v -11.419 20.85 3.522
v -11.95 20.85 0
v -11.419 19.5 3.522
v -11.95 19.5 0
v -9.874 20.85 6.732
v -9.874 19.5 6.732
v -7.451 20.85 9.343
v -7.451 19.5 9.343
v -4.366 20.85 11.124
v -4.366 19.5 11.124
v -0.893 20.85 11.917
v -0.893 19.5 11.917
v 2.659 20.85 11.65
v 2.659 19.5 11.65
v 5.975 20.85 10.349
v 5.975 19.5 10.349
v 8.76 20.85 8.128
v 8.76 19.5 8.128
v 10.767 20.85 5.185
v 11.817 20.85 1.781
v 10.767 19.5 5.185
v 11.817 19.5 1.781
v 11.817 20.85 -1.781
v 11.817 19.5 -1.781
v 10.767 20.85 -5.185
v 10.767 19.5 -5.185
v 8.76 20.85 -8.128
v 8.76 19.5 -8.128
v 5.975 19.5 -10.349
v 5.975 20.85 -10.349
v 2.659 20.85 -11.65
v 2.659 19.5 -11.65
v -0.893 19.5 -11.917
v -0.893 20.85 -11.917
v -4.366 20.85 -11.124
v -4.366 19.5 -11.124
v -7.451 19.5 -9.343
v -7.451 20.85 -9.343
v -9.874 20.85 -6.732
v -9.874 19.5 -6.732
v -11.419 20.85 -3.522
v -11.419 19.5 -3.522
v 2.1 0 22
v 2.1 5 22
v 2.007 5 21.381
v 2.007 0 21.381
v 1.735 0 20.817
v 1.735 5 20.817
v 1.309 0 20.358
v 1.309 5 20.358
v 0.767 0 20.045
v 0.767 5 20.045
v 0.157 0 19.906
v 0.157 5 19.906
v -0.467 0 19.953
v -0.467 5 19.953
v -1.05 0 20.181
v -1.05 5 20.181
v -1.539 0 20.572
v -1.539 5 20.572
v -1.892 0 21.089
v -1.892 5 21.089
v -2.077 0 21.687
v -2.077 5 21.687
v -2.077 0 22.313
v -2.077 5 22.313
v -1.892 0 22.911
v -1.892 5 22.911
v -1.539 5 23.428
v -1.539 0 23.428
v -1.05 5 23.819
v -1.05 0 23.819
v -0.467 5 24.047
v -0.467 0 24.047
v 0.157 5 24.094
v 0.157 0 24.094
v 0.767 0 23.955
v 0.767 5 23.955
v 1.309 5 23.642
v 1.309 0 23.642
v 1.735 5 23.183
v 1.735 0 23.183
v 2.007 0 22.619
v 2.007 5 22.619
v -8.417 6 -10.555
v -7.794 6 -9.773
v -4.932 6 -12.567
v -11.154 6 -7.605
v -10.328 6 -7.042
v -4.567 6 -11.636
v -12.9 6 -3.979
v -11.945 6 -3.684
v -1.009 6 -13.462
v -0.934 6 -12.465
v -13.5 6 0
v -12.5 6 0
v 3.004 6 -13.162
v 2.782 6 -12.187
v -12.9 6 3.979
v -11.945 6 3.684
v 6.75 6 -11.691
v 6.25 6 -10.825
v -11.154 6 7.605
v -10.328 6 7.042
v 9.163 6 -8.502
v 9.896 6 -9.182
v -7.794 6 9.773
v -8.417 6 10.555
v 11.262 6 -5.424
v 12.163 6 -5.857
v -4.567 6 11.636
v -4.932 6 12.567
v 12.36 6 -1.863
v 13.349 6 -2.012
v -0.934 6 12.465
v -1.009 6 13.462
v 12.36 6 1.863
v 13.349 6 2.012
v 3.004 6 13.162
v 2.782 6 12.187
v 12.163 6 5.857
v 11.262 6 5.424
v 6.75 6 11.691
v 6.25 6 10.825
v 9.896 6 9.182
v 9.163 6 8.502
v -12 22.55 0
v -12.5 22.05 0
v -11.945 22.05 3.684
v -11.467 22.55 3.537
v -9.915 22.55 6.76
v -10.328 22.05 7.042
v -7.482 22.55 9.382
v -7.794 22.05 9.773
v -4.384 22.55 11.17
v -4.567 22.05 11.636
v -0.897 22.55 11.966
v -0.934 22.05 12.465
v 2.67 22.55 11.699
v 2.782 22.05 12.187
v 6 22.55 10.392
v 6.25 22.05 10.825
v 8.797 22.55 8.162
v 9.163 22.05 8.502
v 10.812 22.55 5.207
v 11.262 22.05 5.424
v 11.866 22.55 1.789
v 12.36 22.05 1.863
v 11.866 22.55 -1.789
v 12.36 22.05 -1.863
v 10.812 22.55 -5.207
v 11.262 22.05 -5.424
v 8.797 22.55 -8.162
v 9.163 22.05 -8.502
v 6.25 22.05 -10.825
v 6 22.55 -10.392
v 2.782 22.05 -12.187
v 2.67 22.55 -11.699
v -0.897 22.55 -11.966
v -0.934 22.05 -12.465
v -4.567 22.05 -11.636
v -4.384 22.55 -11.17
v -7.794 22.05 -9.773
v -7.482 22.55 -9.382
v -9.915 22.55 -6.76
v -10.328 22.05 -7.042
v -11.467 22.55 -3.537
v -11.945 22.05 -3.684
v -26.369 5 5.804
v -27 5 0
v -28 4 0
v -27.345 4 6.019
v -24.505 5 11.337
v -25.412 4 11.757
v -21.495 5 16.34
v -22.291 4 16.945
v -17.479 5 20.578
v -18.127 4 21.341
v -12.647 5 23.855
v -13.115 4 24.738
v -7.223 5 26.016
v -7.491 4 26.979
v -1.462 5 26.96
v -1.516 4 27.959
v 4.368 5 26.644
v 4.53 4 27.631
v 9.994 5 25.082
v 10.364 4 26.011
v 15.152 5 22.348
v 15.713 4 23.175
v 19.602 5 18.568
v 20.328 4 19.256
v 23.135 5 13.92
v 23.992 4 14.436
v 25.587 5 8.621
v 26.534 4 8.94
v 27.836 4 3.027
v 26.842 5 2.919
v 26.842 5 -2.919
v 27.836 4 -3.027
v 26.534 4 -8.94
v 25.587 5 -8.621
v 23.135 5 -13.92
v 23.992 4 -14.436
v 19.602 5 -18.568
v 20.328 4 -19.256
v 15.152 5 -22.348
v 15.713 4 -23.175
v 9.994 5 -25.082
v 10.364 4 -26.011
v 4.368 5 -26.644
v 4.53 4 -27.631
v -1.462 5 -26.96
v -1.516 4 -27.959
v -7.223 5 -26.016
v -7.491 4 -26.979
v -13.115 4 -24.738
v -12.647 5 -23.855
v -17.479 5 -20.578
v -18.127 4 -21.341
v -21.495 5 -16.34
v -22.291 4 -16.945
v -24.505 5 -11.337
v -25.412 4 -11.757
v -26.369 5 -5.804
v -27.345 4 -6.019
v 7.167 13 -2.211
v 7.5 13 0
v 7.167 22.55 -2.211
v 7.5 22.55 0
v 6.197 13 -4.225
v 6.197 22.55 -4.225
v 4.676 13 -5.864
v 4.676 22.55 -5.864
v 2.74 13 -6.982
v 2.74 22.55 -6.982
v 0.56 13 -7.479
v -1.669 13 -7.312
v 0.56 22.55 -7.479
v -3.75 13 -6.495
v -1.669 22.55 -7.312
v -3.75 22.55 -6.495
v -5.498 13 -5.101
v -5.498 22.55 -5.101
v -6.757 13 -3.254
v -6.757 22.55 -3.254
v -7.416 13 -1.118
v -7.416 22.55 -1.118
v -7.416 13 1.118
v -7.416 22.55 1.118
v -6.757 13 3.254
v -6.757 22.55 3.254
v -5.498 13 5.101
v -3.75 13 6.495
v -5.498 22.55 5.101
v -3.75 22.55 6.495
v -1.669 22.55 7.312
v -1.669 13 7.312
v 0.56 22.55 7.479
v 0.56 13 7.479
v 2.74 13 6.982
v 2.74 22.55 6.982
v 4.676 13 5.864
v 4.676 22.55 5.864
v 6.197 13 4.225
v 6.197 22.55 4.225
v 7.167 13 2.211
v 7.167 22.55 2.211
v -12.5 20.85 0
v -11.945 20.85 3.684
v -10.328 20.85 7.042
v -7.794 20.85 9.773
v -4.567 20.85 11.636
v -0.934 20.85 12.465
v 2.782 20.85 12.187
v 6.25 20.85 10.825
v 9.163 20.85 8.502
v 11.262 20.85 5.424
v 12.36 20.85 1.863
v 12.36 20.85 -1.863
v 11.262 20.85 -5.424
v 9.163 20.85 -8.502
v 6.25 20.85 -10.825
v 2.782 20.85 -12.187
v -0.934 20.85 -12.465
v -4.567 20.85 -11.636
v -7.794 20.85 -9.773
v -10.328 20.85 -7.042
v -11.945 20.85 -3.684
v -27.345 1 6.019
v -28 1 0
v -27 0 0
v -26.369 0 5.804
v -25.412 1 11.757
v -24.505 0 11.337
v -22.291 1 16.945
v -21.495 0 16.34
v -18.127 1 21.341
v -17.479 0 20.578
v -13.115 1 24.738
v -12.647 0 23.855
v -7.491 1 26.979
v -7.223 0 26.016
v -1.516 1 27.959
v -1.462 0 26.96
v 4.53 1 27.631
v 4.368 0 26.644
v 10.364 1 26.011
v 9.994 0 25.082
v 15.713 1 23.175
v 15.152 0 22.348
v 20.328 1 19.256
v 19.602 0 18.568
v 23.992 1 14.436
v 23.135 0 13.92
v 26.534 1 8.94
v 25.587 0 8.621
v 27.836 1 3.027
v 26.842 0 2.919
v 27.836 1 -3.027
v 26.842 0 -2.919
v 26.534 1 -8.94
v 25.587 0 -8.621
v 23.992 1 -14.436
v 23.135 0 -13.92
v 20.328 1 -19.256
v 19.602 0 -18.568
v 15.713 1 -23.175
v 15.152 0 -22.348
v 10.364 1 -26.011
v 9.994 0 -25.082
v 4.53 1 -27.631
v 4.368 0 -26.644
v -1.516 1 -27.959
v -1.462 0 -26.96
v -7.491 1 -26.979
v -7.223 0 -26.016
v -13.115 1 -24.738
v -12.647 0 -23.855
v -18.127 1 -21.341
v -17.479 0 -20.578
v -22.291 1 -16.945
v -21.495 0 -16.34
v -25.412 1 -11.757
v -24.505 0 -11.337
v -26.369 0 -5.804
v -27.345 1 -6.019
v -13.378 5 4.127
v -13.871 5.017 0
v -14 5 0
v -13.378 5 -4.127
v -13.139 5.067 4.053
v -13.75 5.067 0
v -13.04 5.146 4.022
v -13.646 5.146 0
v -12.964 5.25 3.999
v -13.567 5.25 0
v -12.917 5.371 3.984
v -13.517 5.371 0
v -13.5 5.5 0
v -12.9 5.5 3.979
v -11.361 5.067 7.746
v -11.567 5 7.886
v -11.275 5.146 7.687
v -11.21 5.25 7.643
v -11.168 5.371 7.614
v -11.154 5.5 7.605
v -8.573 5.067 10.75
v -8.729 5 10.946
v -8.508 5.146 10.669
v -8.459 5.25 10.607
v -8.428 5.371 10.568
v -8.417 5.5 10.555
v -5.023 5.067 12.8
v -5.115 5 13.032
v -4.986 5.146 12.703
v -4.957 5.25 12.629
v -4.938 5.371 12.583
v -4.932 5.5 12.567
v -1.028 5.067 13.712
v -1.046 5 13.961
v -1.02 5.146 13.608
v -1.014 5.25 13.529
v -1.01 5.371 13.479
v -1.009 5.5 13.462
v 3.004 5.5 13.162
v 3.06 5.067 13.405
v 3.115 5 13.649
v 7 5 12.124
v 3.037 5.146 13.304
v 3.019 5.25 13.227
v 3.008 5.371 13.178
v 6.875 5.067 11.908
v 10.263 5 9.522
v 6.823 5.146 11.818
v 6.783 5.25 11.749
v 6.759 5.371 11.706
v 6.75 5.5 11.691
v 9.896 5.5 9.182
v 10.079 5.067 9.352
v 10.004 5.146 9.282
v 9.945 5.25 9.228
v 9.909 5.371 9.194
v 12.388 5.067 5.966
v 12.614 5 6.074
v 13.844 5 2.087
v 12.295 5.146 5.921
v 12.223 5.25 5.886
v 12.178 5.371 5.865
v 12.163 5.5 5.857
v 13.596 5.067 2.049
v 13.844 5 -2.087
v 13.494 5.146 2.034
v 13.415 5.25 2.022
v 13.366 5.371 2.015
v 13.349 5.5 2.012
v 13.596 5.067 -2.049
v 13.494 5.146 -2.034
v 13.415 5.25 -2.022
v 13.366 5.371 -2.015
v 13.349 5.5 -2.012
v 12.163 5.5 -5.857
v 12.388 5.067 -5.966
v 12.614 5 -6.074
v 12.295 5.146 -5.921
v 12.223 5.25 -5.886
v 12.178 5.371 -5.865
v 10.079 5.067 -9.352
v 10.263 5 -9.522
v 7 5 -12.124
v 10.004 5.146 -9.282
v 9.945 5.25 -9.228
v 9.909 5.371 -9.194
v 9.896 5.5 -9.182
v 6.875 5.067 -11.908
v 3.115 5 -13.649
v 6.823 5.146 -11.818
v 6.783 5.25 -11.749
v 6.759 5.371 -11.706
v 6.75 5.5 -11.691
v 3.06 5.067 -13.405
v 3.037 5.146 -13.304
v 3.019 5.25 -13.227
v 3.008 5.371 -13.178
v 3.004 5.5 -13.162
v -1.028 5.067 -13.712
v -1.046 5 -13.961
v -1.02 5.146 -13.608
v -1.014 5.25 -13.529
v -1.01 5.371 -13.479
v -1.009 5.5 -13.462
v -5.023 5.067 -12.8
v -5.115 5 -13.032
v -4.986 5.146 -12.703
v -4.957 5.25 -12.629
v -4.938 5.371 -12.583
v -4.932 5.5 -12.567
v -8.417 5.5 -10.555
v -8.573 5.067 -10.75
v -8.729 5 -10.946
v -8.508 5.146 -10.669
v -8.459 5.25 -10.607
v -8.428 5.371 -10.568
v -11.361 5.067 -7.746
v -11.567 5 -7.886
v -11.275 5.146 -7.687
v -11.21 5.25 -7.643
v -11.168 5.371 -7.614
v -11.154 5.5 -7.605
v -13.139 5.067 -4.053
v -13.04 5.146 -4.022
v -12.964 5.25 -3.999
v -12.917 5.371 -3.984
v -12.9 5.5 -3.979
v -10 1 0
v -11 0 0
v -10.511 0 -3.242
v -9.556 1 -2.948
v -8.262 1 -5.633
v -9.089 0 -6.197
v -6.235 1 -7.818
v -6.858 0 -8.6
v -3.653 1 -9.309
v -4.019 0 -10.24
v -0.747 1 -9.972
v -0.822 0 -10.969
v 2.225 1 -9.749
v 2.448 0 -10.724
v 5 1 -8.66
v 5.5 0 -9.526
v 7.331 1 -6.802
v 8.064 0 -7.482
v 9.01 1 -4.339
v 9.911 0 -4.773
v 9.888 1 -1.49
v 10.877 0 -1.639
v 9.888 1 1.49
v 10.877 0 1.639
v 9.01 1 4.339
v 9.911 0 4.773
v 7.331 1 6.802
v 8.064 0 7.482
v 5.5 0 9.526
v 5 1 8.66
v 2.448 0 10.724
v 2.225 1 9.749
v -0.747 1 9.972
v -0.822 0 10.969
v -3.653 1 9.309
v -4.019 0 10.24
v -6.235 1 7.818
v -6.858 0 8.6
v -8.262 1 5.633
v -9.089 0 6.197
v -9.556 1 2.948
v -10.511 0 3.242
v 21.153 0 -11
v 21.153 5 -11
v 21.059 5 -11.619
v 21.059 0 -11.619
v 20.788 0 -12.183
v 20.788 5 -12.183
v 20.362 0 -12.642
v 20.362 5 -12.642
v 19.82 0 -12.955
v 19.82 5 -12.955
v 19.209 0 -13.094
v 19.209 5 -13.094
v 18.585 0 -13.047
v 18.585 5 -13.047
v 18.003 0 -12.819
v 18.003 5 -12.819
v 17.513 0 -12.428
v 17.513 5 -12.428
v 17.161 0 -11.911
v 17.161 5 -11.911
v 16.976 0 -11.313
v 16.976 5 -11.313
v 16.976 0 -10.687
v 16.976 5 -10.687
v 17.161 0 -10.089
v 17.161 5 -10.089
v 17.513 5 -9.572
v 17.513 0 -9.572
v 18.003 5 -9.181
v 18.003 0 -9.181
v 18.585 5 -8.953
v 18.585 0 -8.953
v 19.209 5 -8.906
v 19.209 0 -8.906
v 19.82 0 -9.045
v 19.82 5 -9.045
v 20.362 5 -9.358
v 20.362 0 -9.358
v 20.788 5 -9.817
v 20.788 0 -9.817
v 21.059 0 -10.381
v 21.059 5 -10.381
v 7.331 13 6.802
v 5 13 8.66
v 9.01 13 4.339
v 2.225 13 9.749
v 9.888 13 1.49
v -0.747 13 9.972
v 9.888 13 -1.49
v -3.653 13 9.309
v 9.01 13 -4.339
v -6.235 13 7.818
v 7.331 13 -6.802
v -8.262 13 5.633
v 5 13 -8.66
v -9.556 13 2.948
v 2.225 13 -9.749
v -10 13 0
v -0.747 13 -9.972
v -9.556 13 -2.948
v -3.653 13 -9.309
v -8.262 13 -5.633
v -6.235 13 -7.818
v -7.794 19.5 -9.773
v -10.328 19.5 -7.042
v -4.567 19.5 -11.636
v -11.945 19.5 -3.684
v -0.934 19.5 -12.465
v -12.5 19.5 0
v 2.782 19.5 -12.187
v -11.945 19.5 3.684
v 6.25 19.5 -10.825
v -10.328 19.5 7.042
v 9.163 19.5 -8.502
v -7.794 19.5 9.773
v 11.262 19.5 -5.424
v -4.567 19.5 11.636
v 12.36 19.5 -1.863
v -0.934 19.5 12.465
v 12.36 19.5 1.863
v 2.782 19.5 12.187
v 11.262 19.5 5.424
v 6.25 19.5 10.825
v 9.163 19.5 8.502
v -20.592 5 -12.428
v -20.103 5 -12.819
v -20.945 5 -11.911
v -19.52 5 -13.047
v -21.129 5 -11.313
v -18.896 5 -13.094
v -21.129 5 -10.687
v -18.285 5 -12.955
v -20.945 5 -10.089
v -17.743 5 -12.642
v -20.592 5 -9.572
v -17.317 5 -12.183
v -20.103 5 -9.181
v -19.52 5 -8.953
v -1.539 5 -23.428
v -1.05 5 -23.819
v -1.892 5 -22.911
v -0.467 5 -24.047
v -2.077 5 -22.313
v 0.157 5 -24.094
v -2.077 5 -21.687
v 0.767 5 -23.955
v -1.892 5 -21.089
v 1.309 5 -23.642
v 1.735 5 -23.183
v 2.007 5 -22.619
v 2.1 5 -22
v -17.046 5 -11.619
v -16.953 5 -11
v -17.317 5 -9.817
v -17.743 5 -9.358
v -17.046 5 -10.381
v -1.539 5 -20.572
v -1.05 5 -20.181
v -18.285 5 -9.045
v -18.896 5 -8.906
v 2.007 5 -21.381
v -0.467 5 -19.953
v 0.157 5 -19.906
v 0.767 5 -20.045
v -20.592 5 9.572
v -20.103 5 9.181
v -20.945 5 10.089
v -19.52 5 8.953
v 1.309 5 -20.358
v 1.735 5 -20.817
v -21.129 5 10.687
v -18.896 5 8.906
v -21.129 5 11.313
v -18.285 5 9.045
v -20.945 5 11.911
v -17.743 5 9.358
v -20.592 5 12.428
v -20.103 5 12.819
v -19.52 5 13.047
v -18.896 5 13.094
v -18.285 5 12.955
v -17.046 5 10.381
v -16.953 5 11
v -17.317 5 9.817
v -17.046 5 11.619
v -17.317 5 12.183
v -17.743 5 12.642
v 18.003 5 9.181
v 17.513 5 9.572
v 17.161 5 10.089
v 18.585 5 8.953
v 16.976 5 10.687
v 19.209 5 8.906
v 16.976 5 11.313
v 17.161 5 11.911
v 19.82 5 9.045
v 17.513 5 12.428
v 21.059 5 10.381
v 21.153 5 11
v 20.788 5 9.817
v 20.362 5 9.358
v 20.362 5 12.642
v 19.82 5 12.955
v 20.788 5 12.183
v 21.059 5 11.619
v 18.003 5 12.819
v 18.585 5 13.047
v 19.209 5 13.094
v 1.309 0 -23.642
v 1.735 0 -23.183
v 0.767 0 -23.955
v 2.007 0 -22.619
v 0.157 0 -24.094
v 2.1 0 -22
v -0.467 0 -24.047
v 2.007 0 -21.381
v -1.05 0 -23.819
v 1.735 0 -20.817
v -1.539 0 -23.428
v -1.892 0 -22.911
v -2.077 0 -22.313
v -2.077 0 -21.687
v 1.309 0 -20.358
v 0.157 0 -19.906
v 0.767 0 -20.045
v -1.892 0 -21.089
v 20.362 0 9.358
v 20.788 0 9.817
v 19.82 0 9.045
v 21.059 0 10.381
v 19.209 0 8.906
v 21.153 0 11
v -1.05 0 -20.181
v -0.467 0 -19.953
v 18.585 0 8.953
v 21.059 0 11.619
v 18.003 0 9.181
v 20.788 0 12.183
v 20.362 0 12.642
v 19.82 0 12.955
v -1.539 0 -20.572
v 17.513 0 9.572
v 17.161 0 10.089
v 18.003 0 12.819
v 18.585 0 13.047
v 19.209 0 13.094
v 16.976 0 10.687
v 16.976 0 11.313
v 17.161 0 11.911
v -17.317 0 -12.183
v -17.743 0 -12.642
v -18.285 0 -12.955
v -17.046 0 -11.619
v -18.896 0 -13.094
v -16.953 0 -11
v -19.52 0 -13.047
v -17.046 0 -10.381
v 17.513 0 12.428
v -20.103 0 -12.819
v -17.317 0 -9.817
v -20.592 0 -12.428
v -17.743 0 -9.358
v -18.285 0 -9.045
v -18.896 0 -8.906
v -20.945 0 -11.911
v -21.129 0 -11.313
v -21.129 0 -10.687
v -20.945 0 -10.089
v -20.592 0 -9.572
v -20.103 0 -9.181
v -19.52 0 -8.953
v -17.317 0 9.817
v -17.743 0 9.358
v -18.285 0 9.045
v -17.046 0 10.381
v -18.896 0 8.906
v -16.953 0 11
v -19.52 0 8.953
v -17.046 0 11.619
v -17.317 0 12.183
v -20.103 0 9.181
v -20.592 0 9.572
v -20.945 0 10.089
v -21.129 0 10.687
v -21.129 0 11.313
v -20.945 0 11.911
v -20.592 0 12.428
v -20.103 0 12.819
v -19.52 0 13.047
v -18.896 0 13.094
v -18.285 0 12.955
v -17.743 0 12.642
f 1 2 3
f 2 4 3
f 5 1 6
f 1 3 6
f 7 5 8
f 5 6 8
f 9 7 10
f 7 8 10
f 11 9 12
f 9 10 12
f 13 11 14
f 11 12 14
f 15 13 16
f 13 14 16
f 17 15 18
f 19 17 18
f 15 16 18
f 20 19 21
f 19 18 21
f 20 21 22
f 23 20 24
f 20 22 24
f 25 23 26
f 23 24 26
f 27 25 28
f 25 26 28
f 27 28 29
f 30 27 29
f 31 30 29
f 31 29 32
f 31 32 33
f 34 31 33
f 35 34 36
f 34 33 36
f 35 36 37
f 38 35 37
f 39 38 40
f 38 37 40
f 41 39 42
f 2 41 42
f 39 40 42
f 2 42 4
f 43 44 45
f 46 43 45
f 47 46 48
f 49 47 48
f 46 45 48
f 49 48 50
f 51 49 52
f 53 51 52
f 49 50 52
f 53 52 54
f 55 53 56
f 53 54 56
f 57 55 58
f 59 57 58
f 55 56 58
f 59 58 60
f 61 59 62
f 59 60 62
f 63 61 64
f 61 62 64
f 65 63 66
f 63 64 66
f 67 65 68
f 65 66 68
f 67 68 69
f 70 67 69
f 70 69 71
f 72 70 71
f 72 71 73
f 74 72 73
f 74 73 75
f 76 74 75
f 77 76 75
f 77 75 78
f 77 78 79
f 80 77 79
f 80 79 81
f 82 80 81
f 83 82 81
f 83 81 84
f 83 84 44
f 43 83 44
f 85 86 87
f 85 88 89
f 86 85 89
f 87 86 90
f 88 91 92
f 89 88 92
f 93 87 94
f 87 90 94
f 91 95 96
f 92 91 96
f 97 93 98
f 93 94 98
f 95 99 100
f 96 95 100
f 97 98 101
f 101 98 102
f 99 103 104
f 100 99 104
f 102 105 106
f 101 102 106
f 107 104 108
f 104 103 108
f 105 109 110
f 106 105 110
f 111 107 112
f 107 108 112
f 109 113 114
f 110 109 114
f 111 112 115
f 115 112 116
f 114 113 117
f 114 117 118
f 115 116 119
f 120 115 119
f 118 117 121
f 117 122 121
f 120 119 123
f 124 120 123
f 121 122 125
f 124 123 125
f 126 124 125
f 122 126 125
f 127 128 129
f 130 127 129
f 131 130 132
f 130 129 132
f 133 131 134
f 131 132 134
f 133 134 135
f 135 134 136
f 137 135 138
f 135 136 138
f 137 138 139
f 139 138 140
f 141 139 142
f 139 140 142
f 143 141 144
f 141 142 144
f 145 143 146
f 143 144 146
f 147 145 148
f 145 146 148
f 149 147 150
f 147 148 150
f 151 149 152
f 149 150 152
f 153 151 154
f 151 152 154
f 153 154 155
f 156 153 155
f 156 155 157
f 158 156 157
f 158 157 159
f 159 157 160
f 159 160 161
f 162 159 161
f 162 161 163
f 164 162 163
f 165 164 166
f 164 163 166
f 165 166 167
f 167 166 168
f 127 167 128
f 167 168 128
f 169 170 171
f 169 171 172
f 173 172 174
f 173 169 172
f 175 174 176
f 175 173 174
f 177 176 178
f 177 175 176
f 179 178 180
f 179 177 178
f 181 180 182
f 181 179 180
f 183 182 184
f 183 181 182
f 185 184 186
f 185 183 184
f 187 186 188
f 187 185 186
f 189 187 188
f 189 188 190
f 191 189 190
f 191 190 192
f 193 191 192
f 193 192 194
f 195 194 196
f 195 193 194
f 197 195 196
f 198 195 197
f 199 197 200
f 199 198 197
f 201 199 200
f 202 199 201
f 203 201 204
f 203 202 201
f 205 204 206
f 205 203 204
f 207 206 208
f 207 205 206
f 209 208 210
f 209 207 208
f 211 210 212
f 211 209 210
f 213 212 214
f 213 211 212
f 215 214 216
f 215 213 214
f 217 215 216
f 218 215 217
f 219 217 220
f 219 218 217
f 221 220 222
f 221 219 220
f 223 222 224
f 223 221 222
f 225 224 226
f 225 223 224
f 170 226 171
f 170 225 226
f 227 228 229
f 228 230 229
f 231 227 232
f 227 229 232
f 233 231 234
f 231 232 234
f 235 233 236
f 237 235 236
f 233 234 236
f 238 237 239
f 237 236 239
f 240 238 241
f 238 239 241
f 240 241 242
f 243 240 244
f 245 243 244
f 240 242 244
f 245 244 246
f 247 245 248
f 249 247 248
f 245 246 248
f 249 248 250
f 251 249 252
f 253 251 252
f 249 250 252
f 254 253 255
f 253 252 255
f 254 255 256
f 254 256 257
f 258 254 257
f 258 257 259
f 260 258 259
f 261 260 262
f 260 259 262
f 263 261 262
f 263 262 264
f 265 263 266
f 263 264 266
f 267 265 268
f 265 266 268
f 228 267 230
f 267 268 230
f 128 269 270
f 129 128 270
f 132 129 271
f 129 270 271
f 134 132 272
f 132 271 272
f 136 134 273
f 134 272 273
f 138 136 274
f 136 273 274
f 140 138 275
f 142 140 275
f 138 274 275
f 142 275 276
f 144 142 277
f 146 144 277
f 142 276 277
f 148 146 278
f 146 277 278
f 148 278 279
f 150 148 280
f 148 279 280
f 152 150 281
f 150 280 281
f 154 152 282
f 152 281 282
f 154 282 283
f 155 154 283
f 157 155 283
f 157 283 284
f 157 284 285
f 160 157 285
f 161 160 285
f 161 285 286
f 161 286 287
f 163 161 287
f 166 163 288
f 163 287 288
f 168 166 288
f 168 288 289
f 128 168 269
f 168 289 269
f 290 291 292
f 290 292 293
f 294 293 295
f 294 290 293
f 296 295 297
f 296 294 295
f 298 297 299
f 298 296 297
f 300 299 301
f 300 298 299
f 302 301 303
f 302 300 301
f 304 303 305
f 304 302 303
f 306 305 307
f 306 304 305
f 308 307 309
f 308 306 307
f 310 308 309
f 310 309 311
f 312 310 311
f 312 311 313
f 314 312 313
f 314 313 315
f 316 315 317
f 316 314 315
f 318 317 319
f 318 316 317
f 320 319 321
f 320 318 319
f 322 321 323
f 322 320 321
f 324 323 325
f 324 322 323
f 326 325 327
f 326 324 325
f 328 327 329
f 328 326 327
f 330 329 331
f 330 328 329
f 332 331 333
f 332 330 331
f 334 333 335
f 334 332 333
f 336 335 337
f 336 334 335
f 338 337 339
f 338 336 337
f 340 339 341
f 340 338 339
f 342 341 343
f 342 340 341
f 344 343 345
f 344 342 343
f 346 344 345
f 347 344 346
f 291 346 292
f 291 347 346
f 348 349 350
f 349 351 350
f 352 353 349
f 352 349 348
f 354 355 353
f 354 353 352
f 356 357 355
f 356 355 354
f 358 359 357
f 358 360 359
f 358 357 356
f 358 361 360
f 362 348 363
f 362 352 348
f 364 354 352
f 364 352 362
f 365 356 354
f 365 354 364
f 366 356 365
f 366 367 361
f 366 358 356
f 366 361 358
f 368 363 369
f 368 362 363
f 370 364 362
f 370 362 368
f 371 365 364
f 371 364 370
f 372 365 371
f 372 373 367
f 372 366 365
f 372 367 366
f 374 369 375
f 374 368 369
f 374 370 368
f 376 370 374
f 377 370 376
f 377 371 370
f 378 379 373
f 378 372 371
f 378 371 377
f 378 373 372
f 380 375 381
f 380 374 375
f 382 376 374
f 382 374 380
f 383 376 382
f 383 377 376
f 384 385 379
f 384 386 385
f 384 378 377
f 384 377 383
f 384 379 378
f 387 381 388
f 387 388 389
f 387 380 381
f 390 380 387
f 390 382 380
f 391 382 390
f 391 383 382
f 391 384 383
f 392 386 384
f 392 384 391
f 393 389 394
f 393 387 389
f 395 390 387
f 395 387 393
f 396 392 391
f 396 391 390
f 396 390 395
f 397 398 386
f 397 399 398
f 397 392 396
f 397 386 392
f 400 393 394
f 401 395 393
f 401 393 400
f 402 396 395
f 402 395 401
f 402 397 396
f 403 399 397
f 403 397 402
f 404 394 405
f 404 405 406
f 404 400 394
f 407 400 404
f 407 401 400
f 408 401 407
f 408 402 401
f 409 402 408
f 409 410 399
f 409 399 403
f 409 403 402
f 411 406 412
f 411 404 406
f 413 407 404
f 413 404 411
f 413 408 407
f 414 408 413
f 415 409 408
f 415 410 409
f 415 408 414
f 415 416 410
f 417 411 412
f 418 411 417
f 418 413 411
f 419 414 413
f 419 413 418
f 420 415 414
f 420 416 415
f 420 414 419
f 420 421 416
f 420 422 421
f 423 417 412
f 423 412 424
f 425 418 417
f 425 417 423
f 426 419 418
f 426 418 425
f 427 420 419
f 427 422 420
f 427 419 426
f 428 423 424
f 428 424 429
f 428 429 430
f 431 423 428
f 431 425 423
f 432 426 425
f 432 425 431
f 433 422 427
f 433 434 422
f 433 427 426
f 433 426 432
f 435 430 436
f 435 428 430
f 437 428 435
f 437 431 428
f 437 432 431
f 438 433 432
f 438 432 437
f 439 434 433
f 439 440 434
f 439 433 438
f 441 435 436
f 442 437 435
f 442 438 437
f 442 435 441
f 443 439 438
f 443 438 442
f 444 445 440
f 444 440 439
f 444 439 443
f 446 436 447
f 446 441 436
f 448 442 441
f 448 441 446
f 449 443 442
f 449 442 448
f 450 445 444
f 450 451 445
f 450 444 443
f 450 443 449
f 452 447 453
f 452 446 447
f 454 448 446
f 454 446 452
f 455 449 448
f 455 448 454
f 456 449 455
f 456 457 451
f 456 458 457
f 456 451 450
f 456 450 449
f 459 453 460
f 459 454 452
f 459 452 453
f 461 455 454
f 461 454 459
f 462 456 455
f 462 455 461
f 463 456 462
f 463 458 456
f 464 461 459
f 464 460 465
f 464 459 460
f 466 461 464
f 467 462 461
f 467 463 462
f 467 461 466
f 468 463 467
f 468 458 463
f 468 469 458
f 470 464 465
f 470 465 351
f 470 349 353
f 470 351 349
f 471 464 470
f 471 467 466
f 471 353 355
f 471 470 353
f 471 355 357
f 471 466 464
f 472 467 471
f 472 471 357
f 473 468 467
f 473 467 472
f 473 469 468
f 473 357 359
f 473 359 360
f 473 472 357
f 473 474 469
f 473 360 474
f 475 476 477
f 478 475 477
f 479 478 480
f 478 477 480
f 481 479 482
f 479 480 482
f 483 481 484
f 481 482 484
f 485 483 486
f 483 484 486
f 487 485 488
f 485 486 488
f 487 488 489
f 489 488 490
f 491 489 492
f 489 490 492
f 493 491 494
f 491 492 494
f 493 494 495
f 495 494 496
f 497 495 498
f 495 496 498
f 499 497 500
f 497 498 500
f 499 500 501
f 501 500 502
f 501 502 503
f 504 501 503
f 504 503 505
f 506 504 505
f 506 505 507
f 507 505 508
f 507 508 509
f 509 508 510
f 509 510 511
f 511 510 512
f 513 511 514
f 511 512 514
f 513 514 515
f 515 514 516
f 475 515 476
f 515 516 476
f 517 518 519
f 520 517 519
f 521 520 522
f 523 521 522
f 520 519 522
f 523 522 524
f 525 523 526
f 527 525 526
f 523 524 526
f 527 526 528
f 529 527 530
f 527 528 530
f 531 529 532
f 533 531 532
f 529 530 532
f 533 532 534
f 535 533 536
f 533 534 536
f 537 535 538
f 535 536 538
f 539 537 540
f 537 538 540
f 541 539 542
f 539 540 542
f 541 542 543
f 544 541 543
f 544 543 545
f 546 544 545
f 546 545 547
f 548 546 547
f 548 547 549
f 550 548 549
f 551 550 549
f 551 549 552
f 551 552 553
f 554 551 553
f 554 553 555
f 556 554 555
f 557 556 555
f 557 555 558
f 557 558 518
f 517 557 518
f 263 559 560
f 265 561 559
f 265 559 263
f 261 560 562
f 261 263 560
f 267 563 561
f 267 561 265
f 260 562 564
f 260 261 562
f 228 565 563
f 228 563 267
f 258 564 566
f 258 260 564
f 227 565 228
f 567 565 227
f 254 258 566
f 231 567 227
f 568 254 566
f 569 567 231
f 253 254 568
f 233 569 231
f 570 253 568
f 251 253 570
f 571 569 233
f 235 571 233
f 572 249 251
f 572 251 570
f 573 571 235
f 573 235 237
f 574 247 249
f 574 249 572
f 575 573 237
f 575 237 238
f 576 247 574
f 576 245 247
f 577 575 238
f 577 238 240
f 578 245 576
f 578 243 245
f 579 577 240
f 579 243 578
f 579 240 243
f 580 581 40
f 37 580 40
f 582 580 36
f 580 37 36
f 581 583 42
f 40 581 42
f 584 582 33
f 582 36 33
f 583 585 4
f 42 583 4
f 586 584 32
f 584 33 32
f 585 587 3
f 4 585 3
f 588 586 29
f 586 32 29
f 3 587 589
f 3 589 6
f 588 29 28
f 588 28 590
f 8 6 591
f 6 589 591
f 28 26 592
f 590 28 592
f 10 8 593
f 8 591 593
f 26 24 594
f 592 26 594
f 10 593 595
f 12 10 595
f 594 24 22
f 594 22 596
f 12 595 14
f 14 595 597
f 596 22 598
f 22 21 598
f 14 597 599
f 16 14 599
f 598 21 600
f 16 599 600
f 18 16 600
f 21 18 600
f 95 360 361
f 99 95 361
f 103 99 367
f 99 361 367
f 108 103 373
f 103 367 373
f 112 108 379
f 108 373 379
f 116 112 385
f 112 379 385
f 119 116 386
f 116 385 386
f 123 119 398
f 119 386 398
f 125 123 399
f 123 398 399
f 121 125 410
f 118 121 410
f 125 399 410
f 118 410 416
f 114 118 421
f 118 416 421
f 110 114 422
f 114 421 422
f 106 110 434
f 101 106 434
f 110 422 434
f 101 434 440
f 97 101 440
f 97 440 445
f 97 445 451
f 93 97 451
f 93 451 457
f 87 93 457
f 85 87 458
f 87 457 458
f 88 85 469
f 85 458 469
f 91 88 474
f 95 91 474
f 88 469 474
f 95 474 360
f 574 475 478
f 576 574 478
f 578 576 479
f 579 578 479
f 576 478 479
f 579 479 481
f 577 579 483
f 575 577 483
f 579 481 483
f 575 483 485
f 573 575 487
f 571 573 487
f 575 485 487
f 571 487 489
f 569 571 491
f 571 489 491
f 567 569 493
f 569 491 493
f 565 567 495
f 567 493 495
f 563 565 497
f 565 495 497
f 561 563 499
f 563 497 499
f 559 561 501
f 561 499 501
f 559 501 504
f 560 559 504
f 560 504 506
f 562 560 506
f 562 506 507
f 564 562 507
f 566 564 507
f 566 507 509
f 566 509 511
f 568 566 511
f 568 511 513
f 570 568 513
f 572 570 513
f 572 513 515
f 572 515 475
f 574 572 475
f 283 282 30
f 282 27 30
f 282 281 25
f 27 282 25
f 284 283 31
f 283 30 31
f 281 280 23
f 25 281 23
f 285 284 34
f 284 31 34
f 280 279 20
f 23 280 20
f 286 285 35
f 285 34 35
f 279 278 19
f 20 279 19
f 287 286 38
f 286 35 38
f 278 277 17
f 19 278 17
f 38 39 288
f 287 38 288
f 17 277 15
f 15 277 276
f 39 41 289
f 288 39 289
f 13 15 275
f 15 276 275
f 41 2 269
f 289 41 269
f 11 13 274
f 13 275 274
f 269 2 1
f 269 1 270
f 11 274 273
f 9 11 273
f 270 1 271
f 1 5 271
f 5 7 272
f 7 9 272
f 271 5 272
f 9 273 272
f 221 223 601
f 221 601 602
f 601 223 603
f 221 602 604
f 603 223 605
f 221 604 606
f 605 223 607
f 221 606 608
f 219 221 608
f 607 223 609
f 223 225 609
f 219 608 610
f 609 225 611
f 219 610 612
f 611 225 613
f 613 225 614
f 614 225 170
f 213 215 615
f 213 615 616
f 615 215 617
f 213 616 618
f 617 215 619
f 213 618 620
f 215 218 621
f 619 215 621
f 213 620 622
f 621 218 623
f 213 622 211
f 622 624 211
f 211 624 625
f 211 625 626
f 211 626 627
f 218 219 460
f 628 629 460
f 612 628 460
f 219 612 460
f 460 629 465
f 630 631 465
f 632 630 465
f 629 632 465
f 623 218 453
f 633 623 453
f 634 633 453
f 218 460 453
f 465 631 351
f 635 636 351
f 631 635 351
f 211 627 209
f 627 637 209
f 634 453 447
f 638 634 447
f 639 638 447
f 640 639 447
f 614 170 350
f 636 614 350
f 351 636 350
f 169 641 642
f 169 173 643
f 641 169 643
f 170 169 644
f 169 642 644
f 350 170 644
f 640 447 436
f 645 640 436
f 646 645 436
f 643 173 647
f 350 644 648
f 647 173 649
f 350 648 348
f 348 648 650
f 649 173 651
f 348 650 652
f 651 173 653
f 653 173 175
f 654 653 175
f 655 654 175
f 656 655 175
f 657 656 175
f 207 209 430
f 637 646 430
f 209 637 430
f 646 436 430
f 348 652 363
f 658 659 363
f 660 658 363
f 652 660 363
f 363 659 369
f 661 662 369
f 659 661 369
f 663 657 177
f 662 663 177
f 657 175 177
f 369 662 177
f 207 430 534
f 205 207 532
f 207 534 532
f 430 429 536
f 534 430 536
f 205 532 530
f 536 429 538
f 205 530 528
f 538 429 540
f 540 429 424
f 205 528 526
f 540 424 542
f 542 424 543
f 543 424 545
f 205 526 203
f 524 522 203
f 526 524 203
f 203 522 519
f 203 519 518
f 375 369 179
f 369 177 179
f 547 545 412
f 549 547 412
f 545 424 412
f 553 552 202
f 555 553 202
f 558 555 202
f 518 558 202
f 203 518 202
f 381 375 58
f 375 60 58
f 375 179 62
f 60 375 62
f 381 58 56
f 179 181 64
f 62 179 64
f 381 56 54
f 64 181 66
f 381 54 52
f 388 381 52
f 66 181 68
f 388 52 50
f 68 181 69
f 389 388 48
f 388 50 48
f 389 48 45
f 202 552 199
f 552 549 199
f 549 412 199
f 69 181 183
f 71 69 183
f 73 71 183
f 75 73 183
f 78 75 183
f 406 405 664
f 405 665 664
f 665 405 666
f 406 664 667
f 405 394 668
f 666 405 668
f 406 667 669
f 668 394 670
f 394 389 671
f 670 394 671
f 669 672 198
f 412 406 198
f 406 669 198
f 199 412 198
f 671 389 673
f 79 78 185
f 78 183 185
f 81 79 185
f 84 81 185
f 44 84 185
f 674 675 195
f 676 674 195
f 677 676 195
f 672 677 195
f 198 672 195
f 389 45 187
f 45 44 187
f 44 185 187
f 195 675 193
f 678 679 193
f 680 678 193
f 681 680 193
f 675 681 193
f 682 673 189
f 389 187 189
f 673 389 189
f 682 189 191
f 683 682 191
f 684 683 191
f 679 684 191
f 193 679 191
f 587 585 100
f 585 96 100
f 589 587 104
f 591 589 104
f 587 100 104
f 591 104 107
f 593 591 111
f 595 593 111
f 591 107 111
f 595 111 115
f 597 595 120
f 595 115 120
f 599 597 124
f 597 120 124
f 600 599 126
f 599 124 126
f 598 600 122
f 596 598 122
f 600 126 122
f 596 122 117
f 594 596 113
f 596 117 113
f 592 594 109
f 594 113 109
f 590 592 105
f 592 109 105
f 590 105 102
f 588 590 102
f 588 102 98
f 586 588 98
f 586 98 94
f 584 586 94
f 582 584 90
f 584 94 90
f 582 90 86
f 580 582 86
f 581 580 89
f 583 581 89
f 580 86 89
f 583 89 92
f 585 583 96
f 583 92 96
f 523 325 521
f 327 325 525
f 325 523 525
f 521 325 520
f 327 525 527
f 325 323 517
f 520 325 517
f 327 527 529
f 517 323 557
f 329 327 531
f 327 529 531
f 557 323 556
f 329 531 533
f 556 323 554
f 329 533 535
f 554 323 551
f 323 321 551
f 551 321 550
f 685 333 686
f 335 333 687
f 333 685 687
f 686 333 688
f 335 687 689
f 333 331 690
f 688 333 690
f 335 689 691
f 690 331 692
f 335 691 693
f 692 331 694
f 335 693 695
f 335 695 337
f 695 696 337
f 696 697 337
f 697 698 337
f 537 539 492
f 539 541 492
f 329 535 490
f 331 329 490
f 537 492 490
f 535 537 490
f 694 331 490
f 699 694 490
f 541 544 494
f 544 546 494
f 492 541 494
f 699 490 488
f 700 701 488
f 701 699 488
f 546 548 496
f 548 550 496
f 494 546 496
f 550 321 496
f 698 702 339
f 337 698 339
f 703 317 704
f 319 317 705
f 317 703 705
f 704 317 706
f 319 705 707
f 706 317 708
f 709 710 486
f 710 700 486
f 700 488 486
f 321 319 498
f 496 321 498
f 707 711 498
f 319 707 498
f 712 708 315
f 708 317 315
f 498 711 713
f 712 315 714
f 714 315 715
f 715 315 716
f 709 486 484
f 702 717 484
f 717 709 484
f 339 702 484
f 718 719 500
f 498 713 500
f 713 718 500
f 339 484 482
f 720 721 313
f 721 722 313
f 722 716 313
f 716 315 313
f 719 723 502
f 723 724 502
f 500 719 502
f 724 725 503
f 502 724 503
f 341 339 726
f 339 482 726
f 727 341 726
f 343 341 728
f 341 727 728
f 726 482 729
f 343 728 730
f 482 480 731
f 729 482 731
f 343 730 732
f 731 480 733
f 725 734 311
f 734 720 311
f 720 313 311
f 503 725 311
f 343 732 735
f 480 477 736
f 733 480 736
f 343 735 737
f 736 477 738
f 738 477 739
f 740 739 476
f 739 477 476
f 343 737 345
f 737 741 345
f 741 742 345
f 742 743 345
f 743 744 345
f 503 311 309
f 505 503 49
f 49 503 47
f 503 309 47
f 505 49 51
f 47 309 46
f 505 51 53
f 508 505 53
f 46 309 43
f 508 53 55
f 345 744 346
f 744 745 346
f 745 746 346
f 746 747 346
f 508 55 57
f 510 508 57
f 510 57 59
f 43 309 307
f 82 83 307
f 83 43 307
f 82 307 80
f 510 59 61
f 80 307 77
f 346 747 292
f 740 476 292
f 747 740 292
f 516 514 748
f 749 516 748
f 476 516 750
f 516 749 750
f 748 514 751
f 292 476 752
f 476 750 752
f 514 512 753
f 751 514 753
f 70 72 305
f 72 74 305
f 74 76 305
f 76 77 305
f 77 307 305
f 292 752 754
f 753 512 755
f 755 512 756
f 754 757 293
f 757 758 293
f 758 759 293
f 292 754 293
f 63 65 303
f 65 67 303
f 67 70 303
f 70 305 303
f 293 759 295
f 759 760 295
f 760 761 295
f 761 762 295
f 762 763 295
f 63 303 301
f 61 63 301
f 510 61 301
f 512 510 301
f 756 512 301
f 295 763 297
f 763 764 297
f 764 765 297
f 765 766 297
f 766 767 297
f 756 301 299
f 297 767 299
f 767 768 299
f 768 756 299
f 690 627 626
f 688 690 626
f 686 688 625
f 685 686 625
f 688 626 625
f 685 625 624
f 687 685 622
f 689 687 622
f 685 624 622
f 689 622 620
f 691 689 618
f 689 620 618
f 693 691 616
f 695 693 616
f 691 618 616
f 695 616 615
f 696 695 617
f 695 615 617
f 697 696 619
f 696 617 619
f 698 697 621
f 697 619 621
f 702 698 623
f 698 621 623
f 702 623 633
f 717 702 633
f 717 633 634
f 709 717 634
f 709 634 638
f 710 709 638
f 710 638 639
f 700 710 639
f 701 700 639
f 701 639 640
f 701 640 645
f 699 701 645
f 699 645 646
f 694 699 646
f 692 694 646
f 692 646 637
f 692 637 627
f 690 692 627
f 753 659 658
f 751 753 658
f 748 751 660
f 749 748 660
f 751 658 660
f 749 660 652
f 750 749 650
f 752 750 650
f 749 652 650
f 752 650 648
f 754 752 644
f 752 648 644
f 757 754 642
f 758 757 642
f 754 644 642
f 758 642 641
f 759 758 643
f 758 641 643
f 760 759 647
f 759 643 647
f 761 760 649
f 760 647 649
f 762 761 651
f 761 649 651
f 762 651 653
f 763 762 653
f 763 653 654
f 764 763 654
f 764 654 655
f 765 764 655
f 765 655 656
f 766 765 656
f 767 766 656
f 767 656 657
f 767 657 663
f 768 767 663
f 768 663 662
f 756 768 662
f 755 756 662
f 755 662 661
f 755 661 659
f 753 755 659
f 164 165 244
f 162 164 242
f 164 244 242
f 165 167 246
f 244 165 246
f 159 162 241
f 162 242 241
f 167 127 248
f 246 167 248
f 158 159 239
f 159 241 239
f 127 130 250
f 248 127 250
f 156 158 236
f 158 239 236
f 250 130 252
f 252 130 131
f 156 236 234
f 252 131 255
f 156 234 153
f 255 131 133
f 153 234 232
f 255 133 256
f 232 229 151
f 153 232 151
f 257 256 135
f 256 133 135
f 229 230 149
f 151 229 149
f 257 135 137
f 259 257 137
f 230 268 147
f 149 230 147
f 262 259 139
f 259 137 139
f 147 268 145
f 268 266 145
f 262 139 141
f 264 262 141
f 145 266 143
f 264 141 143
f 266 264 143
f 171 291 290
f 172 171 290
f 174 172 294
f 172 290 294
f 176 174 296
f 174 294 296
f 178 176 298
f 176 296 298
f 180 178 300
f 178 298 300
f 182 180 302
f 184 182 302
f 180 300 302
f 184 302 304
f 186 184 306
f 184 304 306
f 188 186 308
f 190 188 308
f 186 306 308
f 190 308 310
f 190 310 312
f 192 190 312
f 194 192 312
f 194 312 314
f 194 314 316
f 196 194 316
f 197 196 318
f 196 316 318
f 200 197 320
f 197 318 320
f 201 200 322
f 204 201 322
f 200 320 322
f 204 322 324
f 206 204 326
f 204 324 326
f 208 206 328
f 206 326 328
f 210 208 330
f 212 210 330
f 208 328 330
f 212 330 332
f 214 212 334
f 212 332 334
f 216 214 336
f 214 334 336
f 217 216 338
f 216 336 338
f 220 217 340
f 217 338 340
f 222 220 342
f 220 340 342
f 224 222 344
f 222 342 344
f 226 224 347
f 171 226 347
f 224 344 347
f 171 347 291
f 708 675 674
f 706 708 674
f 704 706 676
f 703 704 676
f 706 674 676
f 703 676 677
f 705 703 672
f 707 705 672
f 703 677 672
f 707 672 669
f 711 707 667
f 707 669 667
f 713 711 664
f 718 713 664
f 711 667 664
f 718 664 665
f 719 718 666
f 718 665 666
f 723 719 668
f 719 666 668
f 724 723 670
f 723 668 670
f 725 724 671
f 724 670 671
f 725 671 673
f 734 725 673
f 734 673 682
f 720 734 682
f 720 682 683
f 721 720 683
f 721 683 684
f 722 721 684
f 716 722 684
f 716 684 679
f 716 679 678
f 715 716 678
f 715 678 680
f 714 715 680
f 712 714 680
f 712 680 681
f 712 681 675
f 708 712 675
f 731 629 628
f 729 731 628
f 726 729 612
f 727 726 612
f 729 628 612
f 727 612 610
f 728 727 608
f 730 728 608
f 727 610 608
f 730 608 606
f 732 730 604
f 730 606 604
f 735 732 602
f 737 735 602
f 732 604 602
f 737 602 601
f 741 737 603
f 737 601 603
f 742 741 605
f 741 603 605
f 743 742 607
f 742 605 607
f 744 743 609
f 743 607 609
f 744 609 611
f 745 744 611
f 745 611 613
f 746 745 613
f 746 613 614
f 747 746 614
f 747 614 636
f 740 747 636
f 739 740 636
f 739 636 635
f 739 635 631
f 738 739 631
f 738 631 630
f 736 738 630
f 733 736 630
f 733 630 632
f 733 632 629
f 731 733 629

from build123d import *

# Parameters (mm, degrees)
HOLE_WIZARD_M5_1_D    = 4.2
M20X1_5_1_D           = 15
M20X1_5_1_CBORE_D     = 20
M20X1_5_1_CBORE_DEPTH = 13
CHAMFER_1_SIZE        = 0.5
CHAMFER_2_SIZE        = 1
FILLET_1_R            = 0.5


with BuildPart() as part:
    # 草图1 → 旋转1 (revolve)
    with BuildSketch(Plane(origin=(0, 0, 0), x_dir=(-1, 0, 0), z_dir=(0, 0, -1)), mode=Mode.PRIVATE) as revolve_1_sk:
        Polygon((-28, 0), (0, 0), (0, 22.55), (-12.5, 22.55), (-12.5, 20.85), (-11.95, 20.85), (-11.95, 19.5), (-12.5, 19.5), (-12.5, 6), (-13.5, 6), (-13.5, 5), (-28, 5), align=None)
    revolve(revolve_1_sk.sketch.rotate(Axis((0, 0, 0), (0, 1, 0)), 180), axis=Axis((0, 0, 0), (0, 1, 0)))

    # M5 螺纹孔1 (through all)
    with Locations(Plane(origin=(0, 0, 0), x_dir=(-1, 0, 0), z_dir=(0, -1, 0))):
        with Locations((0, -22), (-19.052558883, -11), (-19.052558883, 11), (0, 22), (19.052558883, 11), (19.052558883, -11)):
            Hole(HOLE_WIZARD_M5_1_D / 2)

    # M20x1.5 螺纹孔1 (through all)
    with Locations(Plane(origin=(0, 0, 0), x_dir=(-1, 0, 0), z_dir=(0, -1, 0))):
        with Locations((0, 0)):
            CounterBoreHole(M20X1_5_1_D / 2, M20X1_5_1_CBORE_D / 2, M20X1_5_1_CBORE_DEPTH)

    # 倒角1
    chamfer_1_edges = [part.edges().sort_by_distance(p)[0] for p in [
        (12.5, 22.55, 0),
    ]]
    chamfer(chamfer_1_edges, length=CHAMFER_1_SIZE)

    # 倒角2
    chamfer_2_edges = [part.edges().sort_by_distance(p)[0] for p in [
        (28, 0, 0),
        (10, 0, 0),
        (28, 5, 0),
    ]]
    chamfer(chamfer_2_edges, length=CHAMFER_2_SIZE)

    # 圆角1
    fillet_1_edges = [part.edges().sort_by_distance(p)[0] for p in [
        (13.5, 5, 0),
    ]]
    fillet(fillet_1_edges, radius=FILLET_1_R)


solid = part.part
